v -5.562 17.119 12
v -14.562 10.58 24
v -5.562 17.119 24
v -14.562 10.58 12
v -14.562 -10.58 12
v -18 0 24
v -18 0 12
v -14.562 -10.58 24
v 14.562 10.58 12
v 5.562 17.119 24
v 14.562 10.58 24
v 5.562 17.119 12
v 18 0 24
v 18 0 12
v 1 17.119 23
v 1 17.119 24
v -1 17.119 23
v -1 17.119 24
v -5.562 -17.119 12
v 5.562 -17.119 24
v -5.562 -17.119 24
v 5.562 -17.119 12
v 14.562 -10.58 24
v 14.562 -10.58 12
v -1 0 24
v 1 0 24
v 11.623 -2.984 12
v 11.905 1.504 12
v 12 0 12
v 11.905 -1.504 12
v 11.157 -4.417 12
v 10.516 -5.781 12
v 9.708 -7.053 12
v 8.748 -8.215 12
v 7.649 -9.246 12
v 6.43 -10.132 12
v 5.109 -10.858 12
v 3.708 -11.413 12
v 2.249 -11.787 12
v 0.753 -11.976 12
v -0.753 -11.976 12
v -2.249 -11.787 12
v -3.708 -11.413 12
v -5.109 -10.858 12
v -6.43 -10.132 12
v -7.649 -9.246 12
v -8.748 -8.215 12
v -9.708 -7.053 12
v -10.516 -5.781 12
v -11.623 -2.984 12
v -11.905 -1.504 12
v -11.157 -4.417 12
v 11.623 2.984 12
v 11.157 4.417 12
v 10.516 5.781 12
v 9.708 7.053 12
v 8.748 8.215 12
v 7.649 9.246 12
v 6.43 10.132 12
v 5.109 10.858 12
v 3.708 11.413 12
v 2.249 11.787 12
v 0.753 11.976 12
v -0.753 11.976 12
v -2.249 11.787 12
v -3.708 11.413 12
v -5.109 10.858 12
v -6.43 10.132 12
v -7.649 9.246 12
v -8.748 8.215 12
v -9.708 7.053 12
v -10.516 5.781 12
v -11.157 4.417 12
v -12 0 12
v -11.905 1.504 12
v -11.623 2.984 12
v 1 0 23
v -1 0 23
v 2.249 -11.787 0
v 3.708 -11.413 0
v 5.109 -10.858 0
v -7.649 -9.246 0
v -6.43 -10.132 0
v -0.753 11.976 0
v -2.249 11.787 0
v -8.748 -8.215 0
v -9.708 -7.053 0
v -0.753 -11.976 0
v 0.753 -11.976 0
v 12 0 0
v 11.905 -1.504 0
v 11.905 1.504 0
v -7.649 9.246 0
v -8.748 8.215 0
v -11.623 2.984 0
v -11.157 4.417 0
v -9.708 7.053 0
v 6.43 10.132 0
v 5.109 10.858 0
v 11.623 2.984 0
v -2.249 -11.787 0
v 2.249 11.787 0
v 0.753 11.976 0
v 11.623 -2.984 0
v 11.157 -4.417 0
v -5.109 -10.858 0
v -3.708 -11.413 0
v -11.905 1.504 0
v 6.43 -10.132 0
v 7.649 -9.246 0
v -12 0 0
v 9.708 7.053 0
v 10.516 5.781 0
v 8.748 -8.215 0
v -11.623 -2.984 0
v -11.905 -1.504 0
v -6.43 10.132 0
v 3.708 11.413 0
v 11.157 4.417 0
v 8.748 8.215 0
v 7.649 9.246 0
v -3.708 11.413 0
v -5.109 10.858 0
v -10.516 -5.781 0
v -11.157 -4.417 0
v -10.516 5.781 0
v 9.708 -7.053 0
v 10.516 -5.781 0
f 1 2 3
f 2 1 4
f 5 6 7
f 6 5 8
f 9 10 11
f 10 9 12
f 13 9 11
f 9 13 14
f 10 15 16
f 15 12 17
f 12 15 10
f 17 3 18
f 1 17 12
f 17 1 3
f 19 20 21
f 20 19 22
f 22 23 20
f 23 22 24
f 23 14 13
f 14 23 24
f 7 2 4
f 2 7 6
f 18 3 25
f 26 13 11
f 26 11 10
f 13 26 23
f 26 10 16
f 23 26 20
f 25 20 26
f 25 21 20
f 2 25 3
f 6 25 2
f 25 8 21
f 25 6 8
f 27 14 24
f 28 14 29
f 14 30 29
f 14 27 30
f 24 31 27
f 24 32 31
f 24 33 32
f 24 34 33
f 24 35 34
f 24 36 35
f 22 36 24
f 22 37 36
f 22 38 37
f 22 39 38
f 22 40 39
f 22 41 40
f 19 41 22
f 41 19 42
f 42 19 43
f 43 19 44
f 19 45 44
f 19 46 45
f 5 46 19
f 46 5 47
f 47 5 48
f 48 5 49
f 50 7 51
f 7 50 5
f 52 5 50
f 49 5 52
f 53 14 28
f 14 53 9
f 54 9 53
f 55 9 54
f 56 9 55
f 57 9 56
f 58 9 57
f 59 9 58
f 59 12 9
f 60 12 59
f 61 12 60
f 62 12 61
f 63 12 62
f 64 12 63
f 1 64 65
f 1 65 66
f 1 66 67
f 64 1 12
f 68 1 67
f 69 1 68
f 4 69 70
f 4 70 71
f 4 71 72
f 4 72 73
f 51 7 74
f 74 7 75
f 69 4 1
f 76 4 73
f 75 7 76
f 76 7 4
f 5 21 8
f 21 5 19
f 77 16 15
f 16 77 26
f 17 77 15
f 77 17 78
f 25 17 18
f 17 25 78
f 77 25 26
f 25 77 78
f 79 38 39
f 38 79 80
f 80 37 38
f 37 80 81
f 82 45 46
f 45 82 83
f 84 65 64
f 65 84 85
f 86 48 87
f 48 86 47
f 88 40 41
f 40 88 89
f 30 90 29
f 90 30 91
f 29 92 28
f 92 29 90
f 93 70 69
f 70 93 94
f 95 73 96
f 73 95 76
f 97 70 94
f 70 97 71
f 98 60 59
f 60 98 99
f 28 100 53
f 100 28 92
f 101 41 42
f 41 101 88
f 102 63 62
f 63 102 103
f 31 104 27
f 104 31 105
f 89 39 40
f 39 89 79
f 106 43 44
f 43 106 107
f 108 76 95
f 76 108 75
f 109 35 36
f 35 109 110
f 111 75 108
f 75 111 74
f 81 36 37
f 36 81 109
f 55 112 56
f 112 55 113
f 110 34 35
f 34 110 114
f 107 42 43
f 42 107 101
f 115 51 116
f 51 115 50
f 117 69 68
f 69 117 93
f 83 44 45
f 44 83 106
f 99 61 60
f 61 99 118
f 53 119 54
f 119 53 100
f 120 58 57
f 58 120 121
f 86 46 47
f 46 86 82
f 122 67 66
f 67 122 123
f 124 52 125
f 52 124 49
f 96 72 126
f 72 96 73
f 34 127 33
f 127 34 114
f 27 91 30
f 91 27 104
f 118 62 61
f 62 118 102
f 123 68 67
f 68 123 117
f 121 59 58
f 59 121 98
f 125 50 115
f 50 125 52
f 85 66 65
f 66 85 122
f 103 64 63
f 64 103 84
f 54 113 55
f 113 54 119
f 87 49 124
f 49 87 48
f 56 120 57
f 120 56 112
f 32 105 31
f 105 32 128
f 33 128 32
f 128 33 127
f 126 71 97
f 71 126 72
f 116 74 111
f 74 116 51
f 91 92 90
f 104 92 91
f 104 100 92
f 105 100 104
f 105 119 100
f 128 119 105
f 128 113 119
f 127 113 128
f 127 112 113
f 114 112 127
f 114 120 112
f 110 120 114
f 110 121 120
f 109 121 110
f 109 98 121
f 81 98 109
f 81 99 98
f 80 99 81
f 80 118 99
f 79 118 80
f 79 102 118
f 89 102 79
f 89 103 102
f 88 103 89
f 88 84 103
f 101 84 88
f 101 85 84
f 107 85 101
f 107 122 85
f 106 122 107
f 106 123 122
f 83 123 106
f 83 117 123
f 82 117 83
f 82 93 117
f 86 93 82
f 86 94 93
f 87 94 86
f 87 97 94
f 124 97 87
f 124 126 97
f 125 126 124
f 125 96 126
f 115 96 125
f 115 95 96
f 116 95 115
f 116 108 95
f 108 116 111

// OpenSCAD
module knob()
{
  difference(){

    cylinder(h=12, r=12, center=false, $fn=50);
    
  }
  difference(){
    translate([0,0,12])
      cylinder(h=12, r=18, center=false, $fn=10);
    
    color("red"){
      translate([-1,0,23])
      cube(size=[2,20,6], center=false);
    }
  }
}

knob();
